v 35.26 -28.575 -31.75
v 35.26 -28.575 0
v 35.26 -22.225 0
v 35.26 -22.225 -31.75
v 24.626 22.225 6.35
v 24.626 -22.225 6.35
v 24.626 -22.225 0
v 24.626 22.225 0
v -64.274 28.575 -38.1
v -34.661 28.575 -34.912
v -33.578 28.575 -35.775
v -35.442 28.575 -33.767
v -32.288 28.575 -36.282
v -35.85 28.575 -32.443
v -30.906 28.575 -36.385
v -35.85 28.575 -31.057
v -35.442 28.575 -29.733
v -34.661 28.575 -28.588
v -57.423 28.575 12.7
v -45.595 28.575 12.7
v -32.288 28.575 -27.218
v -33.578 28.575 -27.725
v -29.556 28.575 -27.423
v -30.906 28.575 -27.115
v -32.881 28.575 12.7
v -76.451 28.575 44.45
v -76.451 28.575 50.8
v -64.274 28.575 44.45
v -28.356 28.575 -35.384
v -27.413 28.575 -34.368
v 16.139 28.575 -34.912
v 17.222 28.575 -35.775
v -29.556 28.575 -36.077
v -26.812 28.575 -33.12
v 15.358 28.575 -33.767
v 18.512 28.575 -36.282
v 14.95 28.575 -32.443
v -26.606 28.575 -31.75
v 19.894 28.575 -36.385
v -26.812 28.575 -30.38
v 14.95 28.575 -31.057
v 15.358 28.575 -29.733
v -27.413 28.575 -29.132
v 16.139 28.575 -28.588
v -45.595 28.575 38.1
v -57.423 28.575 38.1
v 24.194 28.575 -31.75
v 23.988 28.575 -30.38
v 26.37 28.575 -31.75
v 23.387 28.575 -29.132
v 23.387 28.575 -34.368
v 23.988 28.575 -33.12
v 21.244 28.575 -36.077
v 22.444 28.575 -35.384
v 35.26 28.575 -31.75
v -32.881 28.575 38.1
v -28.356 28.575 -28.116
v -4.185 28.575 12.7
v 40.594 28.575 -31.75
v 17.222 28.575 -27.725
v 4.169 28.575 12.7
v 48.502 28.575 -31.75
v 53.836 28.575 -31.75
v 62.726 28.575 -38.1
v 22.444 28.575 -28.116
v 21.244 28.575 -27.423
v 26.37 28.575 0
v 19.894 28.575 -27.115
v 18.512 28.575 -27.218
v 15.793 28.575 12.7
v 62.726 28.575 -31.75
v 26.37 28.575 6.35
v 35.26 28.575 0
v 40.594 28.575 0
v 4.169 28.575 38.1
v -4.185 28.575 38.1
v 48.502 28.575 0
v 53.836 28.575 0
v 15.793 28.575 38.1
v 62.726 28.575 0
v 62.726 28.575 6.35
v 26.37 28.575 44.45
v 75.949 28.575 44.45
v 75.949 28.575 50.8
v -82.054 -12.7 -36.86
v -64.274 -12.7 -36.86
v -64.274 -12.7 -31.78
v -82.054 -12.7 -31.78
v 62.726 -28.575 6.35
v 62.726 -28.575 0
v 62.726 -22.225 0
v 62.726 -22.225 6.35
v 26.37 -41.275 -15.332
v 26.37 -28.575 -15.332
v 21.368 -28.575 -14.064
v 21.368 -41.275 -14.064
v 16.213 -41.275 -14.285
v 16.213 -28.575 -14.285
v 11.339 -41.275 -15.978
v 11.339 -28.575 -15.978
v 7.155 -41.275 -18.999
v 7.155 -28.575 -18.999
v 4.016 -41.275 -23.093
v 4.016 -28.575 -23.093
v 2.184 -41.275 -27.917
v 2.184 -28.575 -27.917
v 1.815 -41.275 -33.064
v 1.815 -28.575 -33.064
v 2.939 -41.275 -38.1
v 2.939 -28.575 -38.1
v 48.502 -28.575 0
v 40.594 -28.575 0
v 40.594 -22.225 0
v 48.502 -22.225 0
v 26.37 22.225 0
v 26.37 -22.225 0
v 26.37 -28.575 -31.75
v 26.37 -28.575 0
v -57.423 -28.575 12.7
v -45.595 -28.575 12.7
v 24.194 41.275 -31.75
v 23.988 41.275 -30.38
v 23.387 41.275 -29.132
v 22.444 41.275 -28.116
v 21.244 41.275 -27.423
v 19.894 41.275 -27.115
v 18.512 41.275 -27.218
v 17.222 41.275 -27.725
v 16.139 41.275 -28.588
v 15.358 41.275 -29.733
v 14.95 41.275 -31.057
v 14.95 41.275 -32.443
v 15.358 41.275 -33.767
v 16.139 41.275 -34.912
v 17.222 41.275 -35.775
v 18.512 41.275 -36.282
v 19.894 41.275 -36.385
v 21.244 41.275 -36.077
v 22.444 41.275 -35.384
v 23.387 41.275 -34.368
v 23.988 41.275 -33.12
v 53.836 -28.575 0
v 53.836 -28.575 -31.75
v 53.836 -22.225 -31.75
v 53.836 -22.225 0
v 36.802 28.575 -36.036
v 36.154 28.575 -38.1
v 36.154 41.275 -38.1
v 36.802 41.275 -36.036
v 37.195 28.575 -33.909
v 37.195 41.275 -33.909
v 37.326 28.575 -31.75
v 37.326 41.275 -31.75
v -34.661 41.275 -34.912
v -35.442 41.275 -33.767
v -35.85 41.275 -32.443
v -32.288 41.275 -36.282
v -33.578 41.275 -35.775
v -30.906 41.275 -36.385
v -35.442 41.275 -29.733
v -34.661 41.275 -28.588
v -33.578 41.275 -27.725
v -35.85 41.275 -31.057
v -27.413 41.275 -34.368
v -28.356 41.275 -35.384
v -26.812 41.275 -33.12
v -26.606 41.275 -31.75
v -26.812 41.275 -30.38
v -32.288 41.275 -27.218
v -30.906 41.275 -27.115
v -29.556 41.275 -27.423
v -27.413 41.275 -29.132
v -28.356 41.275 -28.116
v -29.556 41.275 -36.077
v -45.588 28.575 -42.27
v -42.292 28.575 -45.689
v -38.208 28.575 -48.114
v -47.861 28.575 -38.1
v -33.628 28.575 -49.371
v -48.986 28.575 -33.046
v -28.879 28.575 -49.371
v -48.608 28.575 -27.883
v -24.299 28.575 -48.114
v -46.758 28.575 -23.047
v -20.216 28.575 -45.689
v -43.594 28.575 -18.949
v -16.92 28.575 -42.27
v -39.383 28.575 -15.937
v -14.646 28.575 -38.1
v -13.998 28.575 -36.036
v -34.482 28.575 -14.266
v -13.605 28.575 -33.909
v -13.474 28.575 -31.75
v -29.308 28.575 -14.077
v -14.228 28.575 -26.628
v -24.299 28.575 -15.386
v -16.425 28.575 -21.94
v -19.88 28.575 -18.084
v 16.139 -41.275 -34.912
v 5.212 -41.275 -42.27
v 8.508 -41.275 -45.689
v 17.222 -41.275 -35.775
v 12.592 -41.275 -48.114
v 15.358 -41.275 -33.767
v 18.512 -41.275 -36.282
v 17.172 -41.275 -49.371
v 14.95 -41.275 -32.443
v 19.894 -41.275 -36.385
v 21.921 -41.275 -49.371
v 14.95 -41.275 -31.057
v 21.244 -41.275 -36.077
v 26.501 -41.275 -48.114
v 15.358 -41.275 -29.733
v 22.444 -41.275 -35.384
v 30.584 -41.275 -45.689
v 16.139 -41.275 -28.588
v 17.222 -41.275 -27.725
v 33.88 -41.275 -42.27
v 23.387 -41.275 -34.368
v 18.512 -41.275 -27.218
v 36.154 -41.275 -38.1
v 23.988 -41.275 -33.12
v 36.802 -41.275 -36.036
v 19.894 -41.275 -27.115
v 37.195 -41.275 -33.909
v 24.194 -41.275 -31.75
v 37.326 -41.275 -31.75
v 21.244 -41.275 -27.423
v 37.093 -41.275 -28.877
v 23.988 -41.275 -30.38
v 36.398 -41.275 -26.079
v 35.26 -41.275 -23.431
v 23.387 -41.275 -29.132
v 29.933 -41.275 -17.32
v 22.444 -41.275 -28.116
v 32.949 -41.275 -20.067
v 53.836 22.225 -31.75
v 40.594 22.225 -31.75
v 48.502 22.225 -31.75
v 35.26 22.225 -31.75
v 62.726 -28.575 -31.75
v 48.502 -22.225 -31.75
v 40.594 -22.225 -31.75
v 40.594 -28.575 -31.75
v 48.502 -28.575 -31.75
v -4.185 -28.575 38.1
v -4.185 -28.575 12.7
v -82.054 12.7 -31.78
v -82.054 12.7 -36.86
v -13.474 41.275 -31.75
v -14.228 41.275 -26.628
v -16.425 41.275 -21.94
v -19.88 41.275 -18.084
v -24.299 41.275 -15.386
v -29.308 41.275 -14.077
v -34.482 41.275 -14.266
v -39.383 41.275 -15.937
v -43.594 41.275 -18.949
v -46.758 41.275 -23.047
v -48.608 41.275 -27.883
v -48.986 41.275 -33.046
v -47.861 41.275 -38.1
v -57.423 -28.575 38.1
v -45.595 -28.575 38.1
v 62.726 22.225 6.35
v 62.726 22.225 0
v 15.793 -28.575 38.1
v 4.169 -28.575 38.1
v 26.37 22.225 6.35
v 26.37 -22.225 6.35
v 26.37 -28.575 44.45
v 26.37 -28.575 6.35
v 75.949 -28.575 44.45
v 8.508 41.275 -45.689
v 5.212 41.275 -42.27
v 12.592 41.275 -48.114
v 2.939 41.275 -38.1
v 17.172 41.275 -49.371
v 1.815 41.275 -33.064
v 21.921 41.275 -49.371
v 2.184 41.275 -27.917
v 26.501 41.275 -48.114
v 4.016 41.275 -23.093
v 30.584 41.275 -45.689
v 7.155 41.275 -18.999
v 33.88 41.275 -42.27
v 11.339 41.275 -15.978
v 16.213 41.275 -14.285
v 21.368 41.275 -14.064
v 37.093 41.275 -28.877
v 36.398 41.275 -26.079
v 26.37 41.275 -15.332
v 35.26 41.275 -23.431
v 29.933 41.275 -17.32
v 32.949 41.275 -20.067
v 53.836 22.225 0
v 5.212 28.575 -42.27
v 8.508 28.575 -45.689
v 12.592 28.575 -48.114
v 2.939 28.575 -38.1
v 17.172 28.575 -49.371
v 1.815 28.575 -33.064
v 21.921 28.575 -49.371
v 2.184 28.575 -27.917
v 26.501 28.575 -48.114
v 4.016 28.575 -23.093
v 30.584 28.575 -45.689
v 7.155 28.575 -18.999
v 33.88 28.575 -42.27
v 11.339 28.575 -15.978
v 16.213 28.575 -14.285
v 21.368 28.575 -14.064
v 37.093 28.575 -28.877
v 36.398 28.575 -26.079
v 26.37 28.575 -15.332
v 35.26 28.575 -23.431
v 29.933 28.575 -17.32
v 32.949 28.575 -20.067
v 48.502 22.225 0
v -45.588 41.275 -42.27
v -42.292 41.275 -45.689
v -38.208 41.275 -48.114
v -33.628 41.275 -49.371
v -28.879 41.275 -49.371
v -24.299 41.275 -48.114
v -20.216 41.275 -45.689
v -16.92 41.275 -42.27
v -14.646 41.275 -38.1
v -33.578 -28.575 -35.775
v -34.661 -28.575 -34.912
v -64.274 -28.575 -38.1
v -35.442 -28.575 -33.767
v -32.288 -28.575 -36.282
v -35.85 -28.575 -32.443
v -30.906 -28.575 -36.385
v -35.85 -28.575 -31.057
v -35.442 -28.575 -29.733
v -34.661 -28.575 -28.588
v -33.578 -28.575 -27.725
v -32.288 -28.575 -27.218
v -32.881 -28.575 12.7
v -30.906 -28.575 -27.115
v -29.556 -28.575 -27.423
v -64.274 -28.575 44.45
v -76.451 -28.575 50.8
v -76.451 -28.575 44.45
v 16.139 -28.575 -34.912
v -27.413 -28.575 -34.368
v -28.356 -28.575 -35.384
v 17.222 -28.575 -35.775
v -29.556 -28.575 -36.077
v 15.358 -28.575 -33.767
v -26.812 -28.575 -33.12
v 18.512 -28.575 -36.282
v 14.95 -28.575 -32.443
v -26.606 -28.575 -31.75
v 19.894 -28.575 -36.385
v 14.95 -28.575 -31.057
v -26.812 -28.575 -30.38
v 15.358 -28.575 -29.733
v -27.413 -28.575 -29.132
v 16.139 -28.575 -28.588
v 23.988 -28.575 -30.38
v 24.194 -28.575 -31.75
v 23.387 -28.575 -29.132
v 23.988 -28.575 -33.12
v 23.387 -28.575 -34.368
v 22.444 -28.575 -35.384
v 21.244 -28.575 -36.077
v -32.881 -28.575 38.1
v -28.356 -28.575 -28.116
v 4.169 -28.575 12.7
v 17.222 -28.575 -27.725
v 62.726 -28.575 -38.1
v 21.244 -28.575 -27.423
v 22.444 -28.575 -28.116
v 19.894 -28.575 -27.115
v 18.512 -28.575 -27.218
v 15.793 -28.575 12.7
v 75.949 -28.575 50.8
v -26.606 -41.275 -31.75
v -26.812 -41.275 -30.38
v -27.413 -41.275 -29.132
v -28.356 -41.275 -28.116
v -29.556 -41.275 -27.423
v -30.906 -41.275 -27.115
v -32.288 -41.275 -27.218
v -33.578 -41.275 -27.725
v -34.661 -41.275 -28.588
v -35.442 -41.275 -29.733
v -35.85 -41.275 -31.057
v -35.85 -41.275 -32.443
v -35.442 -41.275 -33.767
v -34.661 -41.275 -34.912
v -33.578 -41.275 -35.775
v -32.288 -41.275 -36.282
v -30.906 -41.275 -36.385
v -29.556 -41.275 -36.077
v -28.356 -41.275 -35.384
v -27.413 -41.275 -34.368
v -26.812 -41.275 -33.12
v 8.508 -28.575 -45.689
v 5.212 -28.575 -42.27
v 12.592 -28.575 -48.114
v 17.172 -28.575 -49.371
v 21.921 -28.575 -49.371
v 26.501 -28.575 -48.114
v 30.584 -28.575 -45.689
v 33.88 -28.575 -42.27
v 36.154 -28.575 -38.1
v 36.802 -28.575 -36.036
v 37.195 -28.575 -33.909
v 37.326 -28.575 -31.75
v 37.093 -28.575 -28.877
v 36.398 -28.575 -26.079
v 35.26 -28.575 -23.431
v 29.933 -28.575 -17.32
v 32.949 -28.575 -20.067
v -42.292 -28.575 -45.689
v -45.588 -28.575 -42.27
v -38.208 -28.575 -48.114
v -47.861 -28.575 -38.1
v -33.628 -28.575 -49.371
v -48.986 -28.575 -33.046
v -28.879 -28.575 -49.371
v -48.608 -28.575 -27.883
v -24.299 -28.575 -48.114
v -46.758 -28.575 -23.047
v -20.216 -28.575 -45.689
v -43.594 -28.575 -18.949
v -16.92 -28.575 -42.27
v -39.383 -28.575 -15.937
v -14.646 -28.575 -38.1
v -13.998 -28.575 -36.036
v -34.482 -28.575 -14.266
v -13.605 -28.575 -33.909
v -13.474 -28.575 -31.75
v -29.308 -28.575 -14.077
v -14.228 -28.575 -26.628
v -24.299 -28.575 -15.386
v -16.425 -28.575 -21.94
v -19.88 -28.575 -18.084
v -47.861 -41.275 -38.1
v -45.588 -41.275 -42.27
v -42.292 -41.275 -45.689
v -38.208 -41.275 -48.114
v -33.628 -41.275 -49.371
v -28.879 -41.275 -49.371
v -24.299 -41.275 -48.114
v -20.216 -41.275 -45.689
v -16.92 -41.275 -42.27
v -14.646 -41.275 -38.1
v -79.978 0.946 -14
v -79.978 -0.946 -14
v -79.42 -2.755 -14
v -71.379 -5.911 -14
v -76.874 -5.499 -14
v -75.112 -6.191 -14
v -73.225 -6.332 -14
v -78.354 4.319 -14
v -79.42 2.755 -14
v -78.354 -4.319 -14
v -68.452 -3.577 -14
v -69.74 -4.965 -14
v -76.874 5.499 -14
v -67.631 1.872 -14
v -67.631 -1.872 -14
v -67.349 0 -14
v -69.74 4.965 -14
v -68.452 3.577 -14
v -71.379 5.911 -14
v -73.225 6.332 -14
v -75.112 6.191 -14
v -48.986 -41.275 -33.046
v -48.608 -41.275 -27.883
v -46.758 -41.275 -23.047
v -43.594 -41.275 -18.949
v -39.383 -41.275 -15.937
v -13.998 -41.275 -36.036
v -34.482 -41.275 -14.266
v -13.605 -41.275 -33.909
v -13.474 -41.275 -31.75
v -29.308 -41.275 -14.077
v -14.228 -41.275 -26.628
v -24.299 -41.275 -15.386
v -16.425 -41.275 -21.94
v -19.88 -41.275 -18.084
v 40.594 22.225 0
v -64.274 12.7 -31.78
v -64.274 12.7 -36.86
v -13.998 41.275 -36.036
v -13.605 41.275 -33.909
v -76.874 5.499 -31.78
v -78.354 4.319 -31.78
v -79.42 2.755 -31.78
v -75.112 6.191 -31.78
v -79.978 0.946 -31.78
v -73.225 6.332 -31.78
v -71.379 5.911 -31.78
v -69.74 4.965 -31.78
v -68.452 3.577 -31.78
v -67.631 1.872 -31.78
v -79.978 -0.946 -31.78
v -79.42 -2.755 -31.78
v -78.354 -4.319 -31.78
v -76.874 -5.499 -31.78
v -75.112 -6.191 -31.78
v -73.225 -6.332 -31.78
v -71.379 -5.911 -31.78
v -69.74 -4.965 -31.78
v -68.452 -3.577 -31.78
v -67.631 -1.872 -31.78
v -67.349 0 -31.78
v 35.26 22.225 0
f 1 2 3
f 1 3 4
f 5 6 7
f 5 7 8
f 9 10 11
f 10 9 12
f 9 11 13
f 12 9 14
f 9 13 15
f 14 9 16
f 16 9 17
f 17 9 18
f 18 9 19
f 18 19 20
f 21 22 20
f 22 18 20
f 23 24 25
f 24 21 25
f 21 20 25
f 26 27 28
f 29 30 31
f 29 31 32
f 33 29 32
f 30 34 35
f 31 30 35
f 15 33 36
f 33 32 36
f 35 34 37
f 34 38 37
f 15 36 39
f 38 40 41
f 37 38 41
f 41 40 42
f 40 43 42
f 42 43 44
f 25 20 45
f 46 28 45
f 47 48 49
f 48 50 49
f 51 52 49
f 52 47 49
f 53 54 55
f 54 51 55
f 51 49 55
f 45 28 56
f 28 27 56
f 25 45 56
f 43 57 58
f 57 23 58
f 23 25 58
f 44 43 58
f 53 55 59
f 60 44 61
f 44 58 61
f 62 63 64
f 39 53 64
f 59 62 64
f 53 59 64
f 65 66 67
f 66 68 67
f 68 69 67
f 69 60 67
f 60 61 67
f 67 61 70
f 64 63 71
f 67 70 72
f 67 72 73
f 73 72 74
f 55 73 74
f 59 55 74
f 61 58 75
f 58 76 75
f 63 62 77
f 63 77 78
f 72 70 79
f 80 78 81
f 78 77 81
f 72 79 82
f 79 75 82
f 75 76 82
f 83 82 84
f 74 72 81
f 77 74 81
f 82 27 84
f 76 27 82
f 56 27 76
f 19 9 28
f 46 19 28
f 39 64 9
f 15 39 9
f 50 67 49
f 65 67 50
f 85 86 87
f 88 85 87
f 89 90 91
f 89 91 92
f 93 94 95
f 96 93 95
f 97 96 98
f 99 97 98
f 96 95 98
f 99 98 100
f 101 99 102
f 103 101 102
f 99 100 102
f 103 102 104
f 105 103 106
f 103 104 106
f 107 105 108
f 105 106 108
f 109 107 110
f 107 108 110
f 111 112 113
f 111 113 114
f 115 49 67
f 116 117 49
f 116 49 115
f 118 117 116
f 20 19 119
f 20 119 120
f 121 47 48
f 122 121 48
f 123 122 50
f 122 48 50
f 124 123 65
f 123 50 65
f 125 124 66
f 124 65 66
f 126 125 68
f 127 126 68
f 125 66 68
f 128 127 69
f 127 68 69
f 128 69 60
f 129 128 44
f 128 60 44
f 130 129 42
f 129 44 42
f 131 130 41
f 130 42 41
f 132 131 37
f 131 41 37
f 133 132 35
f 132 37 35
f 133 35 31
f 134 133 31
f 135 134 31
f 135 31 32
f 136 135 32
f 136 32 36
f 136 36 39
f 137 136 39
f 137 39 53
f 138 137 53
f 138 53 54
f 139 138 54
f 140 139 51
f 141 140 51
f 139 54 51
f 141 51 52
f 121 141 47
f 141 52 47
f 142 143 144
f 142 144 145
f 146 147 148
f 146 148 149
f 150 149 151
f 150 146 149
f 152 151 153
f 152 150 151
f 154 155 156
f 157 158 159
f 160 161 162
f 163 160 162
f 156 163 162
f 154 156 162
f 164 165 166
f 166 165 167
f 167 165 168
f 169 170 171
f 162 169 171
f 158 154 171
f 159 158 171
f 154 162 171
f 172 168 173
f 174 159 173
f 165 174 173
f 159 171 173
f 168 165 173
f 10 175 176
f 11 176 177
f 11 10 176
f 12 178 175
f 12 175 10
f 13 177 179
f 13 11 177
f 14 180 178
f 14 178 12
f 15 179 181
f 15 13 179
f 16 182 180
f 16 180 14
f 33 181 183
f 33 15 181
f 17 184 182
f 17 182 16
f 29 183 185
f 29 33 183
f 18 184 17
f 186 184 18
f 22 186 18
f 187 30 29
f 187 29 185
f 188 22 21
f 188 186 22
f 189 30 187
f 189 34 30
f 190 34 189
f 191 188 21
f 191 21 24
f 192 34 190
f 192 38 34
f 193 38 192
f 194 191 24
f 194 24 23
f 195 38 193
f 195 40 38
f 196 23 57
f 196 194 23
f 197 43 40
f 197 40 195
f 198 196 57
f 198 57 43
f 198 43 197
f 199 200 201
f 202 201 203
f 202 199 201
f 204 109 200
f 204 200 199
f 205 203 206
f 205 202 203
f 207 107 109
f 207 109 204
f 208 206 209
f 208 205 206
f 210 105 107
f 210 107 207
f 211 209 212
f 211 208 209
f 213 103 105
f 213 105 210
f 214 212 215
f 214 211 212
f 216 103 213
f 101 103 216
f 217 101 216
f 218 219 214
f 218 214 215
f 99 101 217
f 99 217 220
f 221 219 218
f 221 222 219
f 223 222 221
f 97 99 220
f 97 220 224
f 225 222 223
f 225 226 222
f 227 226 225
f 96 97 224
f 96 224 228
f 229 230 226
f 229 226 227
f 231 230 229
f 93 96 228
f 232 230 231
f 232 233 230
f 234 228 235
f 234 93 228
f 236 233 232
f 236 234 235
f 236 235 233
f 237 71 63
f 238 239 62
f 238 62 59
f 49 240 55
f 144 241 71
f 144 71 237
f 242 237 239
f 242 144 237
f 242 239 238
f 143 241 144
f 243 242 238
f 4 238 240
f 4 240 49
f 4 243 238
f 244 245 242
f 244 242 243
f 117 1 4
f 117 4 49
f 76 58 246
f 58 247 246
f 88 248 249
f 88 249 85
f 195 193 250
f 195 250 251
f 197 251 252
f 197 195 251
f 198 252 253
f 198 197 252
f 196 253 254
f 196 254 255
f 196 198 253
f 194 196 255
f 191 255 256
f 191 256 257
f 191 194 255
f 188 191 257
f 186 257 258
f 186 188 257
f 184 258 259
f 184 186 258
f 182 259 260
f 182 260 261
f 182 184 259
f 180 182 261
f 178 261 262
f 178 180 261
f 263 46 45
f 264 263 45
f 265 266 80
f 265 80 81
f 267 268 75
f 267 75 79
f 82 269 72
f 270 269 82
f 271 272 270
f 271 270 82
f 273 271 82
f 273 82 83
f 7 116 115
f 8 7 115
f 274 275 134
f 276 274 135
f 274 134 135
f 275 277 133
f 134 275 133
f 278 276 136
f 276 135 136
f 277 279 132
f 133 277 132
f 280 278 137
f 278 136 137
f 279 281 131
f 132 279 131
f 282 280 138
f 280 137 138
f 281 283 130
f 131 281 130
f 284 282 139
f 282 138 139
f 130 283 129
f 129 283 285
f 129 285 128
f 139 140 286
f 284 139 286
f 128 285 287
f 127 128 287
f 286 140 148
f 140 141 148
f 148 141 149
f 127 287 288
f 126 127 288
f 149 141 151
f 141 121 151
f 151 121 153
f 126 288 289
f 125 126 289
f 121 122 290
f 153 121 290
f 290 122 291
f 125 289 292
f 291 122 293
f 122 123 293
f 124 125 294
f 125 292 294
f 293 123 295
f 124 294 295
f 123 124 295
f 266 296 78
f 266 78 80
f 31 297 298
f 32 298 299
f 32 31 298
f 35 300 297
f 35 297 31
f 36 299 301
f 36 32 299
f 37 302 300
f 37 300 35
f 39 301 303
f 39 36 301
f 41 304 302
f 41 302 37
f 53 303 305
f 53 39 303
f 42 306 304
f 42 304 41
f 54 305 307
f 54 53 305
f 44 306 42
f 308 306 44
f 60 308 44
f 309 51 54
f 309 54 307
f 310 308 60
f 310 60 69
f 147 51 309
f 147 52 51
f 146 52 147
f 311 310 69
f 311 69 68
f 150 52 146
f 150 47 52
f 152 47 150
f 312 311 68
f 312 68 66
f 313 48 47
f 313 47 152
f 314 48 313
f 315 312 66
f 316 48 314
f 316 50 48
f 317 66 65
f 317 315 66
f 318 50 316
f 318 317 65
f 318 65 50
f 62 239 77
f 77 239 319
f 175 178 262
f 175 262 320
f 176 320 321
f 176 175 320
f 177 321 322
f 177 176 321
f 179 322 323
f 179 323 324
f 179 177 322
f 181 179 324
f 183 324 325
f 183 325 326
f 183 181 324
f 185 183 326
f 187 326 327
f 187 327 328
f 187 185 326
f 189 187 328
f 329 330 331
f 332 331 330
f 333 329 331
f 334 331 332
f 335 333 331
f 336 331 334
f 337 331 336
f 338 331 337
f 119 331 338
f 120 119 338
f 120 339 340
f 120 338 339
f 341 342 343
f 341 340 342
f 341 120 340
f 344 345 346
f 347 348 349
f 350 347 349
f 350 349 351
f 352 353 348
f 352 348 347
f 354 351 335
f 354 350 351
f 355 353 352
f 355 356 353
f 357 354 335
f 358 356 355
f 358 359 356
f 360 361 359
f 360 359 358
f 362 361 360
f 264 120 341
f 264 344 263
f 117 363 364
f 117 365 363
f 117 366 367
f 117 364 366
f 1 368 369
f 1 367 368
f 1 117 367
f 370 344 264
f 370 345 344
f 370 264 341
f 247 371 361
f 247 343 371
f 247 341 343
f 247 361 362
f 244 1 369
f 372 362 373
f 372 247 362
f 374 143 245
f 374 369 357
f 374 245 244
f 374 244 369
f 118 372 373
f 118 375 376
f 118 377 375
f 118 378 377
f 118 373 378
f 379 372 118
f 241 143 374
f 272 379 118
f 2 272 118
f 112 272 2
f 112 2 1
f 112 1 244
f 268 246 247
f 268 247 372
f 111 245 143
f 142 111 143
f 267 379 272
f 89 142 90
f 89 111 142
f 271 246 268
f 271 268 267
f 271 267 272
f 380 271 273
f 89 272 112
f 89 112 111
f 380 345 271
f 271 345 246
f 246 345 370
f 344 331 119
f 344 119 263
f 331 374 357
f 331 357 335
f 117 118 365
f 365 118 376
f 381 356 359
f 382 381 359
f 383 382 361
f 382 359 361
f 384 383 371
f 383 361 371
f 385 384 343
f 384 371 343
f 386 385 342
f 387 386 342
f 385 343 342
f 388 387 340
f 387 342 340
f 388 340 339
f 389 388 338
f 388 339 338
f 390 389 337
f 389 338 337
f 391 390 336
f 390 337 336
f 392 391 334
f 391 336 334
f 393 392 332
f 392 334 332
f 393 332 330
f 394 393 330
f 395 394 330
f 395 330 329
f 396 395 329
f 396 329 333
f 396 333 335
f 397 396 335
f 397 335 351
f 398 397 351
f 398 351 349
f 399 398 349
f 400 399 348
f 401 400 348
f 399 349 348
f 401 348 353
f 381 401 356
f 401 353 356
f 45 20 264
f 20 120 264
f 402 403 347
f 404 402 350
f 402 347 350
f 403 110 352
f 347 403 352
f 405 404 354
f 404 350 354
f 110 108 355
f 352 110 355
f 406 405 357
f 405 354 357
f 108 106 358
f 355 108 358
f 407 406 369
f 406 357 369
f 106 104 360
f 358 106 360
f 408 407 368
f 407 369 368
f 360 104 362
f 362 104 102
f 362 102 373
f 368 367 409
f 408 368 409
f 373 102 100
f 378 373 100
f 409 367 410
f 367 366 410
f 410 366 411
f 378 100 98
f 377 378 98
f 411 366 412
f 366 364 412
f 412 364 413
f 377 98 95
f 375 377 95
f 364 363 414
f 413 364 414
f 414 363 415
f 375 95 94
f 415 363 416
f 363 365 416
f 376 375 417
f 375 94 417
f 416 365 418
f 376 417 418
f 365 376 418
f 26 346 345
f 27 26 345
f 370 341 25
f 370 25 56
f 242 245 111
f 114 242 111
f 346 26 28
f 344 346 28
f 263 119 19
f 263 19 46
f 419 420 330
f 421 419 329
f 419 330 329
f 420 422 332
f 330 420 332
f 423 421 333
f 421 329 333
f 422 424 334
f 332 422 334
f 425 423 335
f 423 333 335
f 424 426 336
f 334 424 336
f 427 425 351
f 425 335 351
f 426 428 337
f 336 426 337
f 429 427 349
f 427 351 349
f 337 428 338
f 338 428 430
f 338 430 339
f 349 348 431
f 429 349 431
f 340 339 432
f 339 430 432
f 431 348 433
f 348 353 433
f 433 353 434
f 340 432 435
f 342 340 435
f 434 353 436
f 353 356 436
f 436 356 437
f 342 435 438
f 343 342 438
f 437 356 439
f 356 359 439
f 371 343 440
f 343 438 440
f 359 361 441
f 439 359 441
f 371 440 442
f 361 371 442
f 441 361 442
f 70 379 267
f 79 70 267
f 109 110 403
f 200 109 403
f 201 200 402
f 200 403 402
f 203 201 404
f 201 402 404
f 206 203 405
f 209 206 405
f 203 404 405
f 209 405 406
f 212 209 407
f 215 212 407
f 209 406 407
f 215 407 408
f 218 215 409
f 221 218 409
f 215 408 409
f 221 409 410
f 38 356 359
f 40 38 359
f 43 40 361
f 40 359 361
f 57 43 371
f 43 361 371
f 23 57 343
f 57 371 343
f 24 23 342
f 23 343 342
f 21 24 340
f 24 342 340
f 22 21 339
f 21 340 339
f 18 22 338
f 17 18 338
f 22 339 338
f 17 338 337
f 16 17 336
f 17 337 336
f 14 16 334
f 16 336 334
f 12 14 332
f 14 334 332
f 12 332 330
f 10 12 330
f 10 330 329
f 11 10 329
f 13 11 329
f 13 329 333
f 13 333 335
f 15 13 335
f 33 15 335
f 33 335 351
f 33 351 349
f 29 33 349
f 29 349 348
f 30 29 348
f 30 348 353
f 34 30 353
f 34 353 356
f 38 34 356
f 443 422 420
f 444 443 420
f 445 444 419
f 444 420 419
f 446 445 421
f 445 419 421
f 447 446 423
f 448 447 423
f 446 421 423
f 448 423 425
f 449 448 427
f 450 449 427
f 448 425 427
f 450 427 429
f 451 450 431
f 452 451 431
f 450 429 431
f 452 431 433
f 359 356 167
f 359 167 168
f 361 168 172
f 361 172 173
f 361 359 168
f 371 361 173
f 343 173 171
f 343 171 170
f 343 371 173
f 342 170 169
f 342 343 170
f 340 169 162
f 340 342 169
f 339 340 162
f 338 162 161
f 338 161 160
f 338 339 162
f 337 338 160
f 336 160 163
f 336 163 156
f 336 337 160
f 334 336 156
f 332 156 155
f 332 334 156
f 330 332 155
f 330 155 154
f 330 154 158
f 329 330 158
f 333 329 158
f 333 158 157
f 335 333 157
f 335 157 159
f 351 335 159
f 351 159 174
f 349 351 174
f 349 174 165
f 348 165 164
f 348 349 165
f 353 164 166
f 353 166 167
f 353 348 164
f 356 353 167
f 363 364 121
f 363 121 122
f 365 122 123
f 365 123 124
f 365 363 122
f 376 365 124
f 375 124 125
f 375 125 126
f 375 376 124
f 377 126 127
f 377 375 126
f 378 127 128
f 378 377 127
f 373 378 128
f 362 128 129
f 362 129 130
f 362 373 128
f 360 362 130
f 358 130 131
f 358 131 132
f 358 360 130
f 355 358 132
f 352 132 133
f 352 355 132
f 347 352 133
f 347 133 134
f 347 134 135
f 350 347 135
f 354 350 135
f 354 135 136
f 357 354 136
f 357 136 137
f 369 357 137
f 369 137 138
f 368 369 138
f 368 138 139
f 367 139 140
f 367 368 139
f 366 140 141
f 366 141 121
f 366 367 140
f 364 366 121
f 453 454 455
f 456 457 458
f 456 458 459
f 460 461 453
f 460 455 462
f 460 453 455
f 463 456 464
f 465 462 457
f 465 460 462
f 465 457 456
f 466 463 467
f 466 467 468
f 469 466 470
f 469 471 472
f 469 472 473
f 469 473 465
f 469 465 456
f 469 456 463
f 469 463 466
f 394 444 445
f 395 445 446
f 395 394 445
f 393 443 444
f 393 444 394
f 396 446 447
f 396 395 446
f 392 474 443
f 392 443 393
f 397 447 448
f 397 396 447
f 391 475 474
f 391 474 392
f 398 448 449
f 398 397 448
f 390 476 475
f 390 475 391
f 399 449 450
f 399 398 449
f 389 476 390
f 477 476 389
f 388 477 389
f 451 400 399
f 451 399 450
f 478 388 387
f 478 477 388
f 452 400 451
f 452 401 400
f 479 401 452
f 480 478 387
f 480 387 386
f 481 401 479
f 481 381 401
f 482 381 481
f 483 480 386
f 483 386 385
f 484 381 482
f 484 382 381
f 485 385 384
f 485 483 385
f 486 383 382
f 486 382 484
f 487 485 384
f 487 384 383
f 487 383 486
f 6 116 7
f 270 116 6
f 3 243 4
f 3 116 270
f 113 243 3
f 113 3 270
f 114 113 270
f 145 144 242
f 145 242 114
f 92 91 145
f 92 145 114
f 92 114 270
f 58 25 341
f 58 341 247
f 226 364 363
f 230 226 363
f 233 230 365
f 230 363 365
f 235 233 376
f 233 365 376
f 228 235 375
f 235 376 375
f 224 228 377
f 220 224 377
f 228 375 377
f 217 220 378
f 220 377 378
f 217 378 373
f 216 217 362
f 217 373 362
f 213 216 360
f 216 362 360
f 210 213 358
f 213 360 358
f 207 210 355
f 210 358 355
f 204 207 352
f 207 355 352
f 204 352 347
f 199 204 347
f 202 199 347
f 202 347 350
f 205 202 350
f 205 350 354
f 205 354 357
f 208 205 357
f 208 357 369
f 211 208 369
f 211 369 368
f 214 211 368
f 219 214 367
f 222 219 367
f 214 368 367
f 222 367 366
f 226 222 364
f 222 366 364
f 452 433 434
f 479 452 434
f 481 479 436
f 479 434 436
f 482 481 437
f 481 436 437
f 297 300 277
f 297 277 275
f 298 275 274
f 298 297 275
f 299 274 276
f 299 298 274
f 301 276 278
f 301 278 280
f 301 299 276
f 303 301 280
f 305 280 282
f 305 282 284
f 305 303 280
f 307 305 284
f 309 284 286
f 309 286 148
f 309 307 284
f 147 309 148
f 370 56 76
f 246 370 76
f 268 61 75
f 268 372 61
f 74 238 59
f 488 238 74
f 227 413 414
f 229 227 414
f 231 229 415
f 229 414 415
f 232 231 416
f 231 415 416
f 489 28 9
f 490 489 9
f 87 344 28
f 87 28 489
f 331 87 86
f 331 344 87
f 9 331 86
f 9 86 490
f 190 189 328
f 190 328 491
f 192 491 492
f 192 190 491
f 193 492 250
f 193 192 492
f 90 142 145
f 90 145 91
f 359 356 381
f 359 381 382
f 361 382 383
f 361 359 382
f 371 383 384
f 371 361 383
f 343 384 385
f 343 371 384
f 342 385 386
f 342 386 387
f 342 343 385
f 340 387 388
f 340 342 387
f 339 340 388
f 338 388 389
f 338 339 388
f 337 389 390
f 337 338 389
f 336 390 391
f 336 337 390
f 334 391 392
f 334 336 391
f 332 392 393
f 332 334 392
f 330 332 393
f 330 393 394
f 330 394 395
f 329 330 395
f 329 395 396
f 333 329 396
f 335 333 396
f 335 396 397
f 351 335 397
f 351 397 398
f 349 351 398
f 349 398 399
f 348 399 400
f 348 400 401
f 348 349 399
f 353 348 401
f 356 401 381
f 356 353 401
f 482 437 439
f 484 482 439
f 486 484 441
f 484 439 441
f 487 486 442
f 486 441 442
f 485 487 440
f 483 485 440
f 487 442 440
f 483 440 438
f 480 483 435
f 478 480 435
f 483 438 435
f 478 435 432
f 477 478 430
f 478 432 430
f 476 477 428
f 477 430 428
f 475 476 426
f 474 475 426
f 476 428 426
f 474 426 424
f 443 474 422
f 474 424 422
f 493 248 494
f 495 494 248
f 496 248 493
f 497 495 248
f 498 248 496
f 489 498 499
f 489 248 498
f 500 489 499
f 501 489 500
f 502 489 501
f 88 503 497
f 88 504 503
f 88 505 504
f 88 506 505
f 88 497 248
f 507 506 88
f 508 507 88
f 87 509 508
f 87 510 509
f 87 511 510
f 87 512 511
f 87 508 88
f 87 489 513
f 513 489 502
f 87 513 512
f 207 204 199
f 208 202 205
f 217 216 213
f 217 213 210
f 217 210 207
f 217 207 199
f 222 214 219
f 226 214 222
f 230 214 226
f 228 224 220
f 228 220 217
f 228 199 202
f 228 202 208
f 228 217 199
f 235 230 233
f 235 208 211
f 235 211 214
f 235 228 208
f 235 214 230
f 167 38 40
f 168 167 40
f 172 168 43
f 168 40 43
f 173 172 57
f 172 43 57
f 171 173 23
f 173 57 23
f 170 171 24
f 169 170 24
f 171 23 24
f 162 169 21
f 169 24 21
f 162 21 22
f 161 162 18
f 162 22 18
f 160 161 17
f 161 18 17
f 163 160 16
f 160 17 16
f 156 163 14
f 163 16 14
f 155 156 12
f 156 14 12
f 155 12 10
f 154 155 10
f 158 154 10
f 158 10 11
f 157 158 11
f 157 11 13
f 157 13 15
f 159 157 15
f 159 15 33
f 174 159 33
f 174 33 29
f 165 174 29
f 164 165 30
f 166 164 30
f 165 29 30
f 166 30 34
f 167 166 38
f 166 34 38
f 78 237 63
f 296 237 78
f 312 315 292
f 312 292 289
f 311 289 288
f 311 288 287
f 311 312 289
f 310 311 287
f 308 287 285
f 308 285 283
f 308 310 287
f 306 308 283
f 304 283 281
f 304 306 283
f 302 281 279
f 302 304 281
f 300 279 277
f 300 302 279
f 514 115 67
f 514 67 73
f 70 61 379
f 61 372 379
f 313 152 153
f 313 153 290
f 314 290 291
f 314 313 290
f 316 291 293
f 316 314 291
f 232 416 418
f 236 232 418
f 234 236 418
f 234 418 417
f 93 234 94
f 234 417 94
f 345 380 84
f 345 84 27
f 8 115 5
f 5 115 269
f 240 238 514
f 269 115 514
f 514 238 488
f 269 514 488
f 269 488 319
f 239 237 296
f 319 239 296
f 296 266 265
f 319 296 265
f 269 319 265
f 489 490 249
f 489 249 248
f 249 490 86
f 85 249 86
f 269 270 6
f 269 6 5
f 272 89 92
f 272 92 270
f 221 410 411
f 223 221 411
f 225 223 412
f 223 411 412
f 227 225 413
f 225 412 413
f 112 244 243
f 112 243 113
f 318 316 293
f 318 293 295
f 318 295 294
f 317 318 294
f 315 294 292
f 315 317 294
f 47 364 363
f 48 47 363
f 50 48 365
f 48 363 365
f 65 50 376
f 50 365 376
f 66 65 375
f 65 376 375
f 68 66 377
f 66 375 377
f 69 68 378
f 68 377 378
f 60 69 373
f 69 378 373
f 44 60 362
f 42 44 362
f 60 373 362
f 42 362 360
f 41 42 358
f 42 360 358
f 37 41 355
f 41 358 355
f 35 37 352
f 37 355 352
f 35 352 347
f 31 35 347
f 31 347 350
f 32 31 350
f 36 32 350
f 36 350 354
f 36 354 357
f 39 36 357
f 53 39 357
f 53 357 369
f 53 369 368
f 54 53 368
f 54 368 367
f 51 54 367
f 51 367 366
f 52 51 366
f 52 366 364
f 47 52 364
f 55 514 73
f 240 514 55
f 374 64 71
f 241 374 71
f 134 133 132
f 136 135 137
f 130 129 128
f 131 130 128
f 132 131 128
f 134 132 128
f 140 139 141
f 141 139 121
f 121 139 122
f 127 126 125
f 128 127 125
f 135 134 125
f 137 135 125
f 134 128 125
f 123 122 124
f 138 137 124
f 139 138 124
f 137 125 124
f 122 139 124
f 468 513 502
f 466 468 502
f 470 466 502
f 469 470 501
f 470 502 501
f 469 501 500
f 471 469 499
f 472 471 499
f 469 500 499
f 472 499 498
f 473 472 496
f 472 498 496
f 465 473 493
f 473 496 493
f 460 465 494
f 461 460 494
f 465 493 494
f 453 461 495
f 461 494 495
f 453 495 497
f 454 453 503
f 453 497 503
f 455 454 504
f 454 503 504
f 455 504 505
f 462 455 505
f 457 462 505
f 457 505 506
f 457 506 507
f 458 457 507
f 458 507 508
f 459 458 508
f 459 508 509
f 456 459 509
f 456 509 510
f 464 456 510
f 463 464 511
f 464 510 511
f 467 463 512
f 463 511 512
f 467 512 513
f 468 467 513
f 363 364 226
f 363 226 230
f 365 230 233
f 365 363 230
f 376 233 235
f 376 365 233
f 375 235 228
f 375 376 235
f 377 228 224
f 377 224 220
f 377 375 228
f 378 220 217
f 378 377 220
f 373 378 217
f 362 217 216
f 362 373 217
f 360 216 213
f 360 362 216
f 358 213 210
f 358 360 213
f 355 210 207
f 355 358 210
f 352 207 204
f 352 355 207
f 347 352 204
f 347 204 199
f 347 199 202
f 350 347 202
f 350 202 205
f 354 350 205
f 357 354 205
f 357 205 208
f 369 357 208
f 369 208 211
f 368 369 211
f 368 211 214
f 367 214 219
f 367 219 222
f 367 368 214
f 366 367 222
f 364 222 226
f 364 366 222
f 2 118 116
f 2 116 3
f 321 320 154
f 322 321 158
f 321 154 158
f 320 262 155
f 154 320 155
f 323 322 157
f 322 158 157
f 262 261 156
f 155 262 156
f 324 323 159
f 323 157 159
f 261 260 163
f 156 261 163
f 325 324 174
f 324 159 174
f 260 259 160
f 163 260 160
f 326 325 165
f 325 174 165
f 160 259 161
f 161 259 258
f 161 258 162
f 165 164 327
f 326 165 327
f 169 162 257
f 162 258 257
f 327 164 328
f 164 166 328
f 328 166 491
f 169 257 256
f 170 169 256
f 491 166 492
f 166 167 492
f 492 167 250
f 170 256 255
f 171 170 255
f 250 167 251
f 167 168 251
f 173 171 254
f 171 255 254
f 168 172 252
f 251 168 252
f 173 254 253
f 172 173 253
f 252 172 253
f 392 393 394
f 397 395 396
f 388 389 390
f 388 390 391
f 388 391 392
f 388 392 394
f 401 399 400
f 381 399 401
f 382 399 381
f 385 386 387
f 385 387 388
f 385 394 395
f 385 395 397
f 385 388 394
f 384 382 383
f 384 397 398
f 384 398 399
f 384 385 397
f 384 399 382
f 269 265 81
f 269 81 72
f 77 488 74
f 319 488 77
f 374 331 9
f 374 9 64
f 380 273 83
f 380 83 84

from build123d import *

# Parameters (mm, degrees)
F0_W           = 5.334
F0_H           = 31.75
F0_W_2         = 12.1767708808
F0_H_2         = 6.35
F0_W_3         = 13.2232291192
F0_W_4         = 11.8282231389
F0_H_3         = 25.4
F0_W_5         = 28.695857618
F0_W_6         = 11.6236433387
F1_DEPTH       = 28.575
F2_W           = 44.45
F2_H           = 31.75
F3_DEPTH       = 25.4
F4_W           = 44.45
F4_H           = 6.35
F5_DEPTH       = 38.1
F6_R           = 4.6482
F7_DEPTH       = 12.7
F9_DEPTH       = 12.7
F9_DEPTH_BACK  = 70.104
F10_W          = 25.4
F10_H          = 5.08
F11_DEPTH      = 17.78
F12_R          = 6.35
F13_DEPTH      = 17.78
F14_DEPTH      = 69.85
F14_DEPTH_BACK = 12.7


# Not quite as in the source:
# - a feature names something its author has since deleted; it is built from what else it names


with BuildPart() as f1:
    # F0 (on Front) → F1 (new body, symmetric)
    with BuildSketch(Plane.XZ):
        Polygon((40.5938484461, 0), (35.2598484461, 0), (35.2598484461, -20.7330111994), (35.2598484461, -31.75), (40.5938484461, -31.75), (40.5938484461, -22.8515356839), align=None)
        with Locations((51.1692069136, -15.875)):
            Rectangle(F0_W, F0_H)
        with Locations((-70.3621785268, 47.625)):
            Rectangle(F0_W_2, F0_H_2)
        with Locations((69.3378214732, 47.625)):
            Rectangle(F0_W_3, F0_H_2)
        Polygon((62.7262069136, 50.8), (-64.2737930864, 50.8), (-64.2737930864, 44.45), (26.3698484461, 44.45), (62.7262069136, 44.45), align=None)
        Polygon((26.3698484461, 44.45), (-64.2737930864, 44.45), (-64.2737930864, -38.1), (-47.8611980613, -38.1), (-14.6463881115, -38.1), (13.0988019387, -38.1), (26.3698484461, -38.1), (26.3698484461, -31.75), (26.3698484461, -14.7111620115), (26.3698484461, 0), (26.3698484461, 6.35), align=None)
        with Locations((-51.5087349863, 25.4)):
            Rectangle(F0_W_4, F0_H_3, mode=Mode.SUBTRACT)
        with Locations((-18.5333405269, 25.4)):
            Rectangle(F0_W_5, F0_H_3, mode=Mode.SUBTRACT)
        with Locations((9.980898246, 25.4)):
            Rectangle(F0_W_6, F0_H_3, mode=Mode.SUBTRACT)
        Polygon((62.7262069136, 0), (62.7262069136, 6.35), (26.3698484461, 6.35), (26.3698484461, 0), (35.2598484461, 0), (40.5938484461, 0), (48.5022069136, 0), (53.8362069136, 0), align=None)
        Polygon((62.7262069136, -38.1), (62.7262069136, -31.75), (53.8362069136, -31.75), (48.5022069136, -31.75), (47.4862069136, -31.75), (40.5938484461, -31.75), (35.2598484461, -31.75), (26.3698484461, -31.75), (26.3698484461, -38.1), (46.3136118885, -38.1), align=None)
    extrude(amount=F1_DEPTH, both=True)

    # F2 (on face) → F3 (cut)
    with BuildSketch(Plane.YZ.offset(53.8362069136)):
        with Locations((0, -15.875)):
            Rectangle(F2_W, F2_H)
    extrude(amount=-F3_DEPTH, mode=Mode.SUBTRACT)

    # F4 (on face) → F5 (cut)
    with BuildSketch(Plane.YZ.offset(62.7262069136)):
        with Locations((0, 3.175)):
            Rectangle(F4_W, F4_H)
    extrude(amount=-F5_DEPTH, mode=Mode.SUBTRACT)

    # F6 (on face) → F9 (cut, two sides)
    with BuildSketch(Plane.XZ.offset(28.575)) as f9_sk:
        with Locations((19.5462069136, -31.75)):
            Circle(F6_R)
        with Locations((-31.2537930864, -31.75)):
            Circle(F6_R)
    extrude(amount=F9_DEPTH, mode=Mode.SUBTRACT)
    extrude(f9_sk.sketch, amount=-F9_DEPTH_BACK, mode=Mode.SUBTRACT)

    # F10 (on face) → F11 (join)
    with BuildSketch(Plane(origin=(-64.2737930864, 0, 0), x_dir=(0, -1, 0), z_dir=(-1, 0, 0))):
        with Locations((0, -34.3196164)):
            Rectangle(F10_W, F10_H)
    extrude(amount=F11_DEPTH)

    # F12 (on face) → F13 (join)
    with BuildSketch(Plane.XY.offset(-31.7796164)):
        with Locations((-73.6990726864, 0)):
            Circle(F12_R)
    extrude(amount=F13_DEPTH)


with BuildPart() as f7:
    # F6 (on face) → F7 (new body)
    with BuildSketch(Plane.XZ.offset(28.575)):
        with BuildLine():
            ThreePointArc((36.1536118885, -38.1), (37.0306008186, -34.9786792614), (37.3262069136, -31.75))
            ThreePointArc((37.3262069136, -31.75), (36.8018863619, -27.4639847439), (35.2598484461, -23.4307530517))
            Line((35.2598484461, -23.4307530517), (35.2598484461, -31.75))
            Line((35.2598484461, -31.75), (26.3698484461, -31.75))
            Line((26.3698484461, -31.75), (26.3698484461, -15.331525155))
            ThreePointArc((26.3698484461, -15.331525155), (7.1554293566, -18.9986458941), (2.9388019387, -38.1))
            Line((2.9388019387, -38.1), (36.1536118885, -38.1))
        make_face()
        with Locations((19.5462069136, -31.75)):
            Circle(F6_R, mode=Mode.SUBTRACT)
        with BuildLine():
            Line((35.2598484461, -31.75), (35.2598484461, -23.4307530517))
            ThreePointArc((35.2598484461, -23.4307530517), (31.5204148256, -18.6066844031), (26.3698484461, -15.331525155))
            Line((26.3698484461, -15.331525155), (26.3698484461, -31.75))
            Line((26.3698484461, -31.75), (35.2598484461, -31.75))
        make_face()
        with BuildLine():
            ThreePointArc((2.9388019387, -38.1), (19.5462069136, -49.53), (36.1536118885, -38.1))
            Line((36.1536118885, -38.1), (2.9388019387, -38.1))
        make_face()
    extrude(amount=F7_DEPTH)


with BuildPart() as f7b:
    # F6 (on face) → F7, piece 2 (new body)
    with BuildSketch(Plane.XZ.offset(28.575)):
        with BuildLine():
            Line((-47.8611980613, -38.1), (-14.6463881115, -38.1))
            ThreePointArc((-14.6463881115, -38.1), (-13.7693991814, -34.9786792614), (-13.4737930864, -31.75))
            ThreePointArc((-13.4737930864, -31.75), (-34.4824723478, -14.265606095), (-47.8611980613, -38.1))
        make_face()
        with Locations((-31.2537930864, -31.75)):
            Circle(F6_R, mode=Mode.SUBTRACT)
        with BuildLine():
            ThreePointArc((-47.8611980613, -38.1), (-31.2537930864, -49.53), (-14.6463881115, -38.1))
            Line((-14.6463881115, -38.1), (-47.8611980613, -38.1))
        make_face()
    extrude(amount=F7_DEPTH)


with BuildPart() as f8_1:
    # F8: instance of F7
    add(f7.part.mirror(Plane.XZ))


with BuildPart() as f8_2:
    # F8: instance of F7b
    add(f7b.part.mirror(Plane.XZ))


with BuildPart() as f14:
    # F6 (on face) → F14 (new body, two sides)
    with BuildSketch(Plane.XZ.offset(28.575)) as f14_sk:
        with Locations((-31.2537930864, -31.75)):
            Circle(F6_R)
    extrude(amount=-F14_DEPTH)
    extrude(f14_sk.sketch, amount=F14_DEPTH_BACK)


with BuildPart() as f14b:
    # F6 (on face) → F14, piece 2 (new body, two sides)
    with BuildSketch(Plane.XZ.offset(28.575)) as f14_2_sk:
        with Locations((19.5462069136, -31.75)):
            Circle(F6_R)
    extrude(amount=-F14_DEPTH)
    extrude(f14_2_sk.sketch, amount=F14_DEPTH_BACK)


solid = Compound([f1.part, f7.part, f7b.part, f8_1.part, f8_2.part, f14.part, f14b.part])
